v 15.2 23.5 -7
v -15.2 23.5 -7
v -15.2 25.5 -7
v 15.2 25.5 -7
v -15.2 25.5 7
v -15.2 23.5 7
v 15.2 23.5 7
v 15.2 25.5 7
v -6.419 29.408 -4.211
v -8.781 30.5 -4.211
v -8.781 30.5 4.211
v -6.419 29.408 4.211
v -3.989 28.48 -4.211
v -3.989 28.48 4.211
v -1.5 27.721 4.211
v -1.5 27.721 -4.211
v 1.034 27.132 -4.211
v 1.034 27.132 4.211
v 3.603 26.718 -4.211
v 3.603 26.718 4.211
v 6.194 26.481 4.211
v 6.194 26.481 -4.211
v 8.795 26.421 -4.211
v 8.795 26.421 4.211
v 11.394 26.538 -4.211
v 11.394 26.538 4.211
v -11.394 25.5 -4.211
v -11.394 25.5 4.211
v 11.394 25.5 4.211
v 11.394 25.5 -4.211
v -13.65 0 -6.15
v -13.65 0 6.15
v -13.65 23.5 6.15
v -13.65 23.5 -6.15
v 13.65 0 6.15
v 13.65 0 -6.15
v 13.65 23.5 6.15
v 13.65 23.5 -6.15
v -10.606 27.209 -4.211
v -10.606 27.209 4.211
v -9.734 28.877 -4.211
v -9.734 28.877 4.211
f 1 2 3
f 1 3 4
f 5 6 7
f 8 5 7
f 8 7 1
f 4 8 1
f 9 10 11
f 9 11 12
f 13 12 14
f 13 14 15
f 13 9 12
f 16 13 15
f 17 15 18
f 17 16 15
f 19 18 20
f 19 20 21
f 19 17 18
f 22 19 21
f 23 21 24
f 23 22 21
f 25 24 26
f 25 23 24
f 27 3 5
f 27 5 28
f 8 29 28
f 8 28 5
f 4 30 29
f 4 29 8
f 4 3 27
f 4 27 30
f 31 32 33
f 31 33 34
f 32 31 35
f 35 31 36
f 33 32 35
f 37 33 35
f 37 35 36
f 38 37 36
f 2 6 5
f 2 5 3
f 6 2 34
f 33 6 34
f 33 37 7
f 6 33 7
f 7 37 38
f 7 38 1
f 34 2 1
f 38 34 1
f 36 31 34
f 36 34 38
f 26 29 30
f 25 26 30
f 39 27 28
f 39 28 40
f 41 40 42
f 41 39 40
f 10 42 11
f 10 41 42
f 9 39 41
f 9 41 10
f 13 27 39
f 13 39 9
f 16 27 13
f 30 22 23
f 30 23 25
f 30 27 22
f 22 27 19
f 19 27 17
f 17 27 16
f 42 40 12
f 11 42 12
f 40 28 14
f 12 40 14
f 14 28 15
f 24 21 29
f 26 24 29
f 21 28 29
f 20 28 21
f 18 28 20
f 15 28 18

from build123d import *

# Parameters (mm, degrees)
SKETCH1_W           = 27.3
SKETCH1_H           = 12.3
BOSS_EXTRUDE1_DEPTH = 23.5
SKETCH3_W           = 30.4
SKETCH3_H           = 14
BOSS_EXTRUDE2_DEPTH = 2
SKETCH4_W           = 22.788352984
SKETCH4_H           = 8.421389372
BOSS_EXTRUDE3_DEPTH = 5
CUT_EXTRUDE2_START  = -8.421389371
CUT_EXTRUDE2_DEPTH  = 8.421389371


# Read off the part's stored shape, not the designer's step: Cut-Extrude2
with BuildPart() as part:
    # Sketch1 → Boss-Extrude1 (new body)
    with BuildSketch(Plane(origin=(0, 0, 0), x_dir=(1, 0, 0), z_dir=(0, 1, 0))):
        Rectangle(SKETCH1_W, SKETCH1_H)
    extrude(amount=BOSS_EXTRUDE1_DEPTH)

    # Sketch3 → Boss-Extrude2 (add)
    with BuildSketch(Plane(origin=(0, 23.5, 0), x_dir=(1, 0, 0), z_dir=(0, 1, 0))):
        Rectangle(SKETCH3_W, SKETCH3_H)
    extrude(amount=BOSS_EXTRUDE2_DEPTH)

    # Sketch4 → Boss-Extrude3 (add)
    with BuildSketch(Plane(origin=(0, 25.5, 0), x_dir=(1, 0, 0), z_dir=(0, 1, 0))):
        Rectangle(SKETCH4_W, SKETCH4_H)
    extrude(amount=BOSS_EXTRUDE3_DEPTH)

    # Cut-Extrude2 outline → Cut-Extrude2 (cut)
    with BuildSketch(Plane.XY.offset(4.210694686).offset(CUT_EXTRUDE2_START)):
        with BuildLine():
            ThreePointArc((-11.394176492, 25.5), (-10.180313992, 28.04843269), (-8.781103834, 30.5))
            Line((-8.781103834, 30.5), (-11.394176492, 30.5))
            Line((-11.394176492, 30.5), (-11.394176492, 25.5))
        make_face()
        with BuildLine():
            ThreePointArc((-8.781103834, 30.5), (1.034220457, 27.1323045), (11.394176492, 26.537935189))
            Line((11.394176492, 26.537935189), (11.394176492, 30.5))
            Line((11.394176492, 30.5), (-8.781103834, 30.5))
        make_face()
    extrude(amount=CUT_EXTRUDE2_DEPTH, mode=Mode.SUBTRACT)


solid = part.part
